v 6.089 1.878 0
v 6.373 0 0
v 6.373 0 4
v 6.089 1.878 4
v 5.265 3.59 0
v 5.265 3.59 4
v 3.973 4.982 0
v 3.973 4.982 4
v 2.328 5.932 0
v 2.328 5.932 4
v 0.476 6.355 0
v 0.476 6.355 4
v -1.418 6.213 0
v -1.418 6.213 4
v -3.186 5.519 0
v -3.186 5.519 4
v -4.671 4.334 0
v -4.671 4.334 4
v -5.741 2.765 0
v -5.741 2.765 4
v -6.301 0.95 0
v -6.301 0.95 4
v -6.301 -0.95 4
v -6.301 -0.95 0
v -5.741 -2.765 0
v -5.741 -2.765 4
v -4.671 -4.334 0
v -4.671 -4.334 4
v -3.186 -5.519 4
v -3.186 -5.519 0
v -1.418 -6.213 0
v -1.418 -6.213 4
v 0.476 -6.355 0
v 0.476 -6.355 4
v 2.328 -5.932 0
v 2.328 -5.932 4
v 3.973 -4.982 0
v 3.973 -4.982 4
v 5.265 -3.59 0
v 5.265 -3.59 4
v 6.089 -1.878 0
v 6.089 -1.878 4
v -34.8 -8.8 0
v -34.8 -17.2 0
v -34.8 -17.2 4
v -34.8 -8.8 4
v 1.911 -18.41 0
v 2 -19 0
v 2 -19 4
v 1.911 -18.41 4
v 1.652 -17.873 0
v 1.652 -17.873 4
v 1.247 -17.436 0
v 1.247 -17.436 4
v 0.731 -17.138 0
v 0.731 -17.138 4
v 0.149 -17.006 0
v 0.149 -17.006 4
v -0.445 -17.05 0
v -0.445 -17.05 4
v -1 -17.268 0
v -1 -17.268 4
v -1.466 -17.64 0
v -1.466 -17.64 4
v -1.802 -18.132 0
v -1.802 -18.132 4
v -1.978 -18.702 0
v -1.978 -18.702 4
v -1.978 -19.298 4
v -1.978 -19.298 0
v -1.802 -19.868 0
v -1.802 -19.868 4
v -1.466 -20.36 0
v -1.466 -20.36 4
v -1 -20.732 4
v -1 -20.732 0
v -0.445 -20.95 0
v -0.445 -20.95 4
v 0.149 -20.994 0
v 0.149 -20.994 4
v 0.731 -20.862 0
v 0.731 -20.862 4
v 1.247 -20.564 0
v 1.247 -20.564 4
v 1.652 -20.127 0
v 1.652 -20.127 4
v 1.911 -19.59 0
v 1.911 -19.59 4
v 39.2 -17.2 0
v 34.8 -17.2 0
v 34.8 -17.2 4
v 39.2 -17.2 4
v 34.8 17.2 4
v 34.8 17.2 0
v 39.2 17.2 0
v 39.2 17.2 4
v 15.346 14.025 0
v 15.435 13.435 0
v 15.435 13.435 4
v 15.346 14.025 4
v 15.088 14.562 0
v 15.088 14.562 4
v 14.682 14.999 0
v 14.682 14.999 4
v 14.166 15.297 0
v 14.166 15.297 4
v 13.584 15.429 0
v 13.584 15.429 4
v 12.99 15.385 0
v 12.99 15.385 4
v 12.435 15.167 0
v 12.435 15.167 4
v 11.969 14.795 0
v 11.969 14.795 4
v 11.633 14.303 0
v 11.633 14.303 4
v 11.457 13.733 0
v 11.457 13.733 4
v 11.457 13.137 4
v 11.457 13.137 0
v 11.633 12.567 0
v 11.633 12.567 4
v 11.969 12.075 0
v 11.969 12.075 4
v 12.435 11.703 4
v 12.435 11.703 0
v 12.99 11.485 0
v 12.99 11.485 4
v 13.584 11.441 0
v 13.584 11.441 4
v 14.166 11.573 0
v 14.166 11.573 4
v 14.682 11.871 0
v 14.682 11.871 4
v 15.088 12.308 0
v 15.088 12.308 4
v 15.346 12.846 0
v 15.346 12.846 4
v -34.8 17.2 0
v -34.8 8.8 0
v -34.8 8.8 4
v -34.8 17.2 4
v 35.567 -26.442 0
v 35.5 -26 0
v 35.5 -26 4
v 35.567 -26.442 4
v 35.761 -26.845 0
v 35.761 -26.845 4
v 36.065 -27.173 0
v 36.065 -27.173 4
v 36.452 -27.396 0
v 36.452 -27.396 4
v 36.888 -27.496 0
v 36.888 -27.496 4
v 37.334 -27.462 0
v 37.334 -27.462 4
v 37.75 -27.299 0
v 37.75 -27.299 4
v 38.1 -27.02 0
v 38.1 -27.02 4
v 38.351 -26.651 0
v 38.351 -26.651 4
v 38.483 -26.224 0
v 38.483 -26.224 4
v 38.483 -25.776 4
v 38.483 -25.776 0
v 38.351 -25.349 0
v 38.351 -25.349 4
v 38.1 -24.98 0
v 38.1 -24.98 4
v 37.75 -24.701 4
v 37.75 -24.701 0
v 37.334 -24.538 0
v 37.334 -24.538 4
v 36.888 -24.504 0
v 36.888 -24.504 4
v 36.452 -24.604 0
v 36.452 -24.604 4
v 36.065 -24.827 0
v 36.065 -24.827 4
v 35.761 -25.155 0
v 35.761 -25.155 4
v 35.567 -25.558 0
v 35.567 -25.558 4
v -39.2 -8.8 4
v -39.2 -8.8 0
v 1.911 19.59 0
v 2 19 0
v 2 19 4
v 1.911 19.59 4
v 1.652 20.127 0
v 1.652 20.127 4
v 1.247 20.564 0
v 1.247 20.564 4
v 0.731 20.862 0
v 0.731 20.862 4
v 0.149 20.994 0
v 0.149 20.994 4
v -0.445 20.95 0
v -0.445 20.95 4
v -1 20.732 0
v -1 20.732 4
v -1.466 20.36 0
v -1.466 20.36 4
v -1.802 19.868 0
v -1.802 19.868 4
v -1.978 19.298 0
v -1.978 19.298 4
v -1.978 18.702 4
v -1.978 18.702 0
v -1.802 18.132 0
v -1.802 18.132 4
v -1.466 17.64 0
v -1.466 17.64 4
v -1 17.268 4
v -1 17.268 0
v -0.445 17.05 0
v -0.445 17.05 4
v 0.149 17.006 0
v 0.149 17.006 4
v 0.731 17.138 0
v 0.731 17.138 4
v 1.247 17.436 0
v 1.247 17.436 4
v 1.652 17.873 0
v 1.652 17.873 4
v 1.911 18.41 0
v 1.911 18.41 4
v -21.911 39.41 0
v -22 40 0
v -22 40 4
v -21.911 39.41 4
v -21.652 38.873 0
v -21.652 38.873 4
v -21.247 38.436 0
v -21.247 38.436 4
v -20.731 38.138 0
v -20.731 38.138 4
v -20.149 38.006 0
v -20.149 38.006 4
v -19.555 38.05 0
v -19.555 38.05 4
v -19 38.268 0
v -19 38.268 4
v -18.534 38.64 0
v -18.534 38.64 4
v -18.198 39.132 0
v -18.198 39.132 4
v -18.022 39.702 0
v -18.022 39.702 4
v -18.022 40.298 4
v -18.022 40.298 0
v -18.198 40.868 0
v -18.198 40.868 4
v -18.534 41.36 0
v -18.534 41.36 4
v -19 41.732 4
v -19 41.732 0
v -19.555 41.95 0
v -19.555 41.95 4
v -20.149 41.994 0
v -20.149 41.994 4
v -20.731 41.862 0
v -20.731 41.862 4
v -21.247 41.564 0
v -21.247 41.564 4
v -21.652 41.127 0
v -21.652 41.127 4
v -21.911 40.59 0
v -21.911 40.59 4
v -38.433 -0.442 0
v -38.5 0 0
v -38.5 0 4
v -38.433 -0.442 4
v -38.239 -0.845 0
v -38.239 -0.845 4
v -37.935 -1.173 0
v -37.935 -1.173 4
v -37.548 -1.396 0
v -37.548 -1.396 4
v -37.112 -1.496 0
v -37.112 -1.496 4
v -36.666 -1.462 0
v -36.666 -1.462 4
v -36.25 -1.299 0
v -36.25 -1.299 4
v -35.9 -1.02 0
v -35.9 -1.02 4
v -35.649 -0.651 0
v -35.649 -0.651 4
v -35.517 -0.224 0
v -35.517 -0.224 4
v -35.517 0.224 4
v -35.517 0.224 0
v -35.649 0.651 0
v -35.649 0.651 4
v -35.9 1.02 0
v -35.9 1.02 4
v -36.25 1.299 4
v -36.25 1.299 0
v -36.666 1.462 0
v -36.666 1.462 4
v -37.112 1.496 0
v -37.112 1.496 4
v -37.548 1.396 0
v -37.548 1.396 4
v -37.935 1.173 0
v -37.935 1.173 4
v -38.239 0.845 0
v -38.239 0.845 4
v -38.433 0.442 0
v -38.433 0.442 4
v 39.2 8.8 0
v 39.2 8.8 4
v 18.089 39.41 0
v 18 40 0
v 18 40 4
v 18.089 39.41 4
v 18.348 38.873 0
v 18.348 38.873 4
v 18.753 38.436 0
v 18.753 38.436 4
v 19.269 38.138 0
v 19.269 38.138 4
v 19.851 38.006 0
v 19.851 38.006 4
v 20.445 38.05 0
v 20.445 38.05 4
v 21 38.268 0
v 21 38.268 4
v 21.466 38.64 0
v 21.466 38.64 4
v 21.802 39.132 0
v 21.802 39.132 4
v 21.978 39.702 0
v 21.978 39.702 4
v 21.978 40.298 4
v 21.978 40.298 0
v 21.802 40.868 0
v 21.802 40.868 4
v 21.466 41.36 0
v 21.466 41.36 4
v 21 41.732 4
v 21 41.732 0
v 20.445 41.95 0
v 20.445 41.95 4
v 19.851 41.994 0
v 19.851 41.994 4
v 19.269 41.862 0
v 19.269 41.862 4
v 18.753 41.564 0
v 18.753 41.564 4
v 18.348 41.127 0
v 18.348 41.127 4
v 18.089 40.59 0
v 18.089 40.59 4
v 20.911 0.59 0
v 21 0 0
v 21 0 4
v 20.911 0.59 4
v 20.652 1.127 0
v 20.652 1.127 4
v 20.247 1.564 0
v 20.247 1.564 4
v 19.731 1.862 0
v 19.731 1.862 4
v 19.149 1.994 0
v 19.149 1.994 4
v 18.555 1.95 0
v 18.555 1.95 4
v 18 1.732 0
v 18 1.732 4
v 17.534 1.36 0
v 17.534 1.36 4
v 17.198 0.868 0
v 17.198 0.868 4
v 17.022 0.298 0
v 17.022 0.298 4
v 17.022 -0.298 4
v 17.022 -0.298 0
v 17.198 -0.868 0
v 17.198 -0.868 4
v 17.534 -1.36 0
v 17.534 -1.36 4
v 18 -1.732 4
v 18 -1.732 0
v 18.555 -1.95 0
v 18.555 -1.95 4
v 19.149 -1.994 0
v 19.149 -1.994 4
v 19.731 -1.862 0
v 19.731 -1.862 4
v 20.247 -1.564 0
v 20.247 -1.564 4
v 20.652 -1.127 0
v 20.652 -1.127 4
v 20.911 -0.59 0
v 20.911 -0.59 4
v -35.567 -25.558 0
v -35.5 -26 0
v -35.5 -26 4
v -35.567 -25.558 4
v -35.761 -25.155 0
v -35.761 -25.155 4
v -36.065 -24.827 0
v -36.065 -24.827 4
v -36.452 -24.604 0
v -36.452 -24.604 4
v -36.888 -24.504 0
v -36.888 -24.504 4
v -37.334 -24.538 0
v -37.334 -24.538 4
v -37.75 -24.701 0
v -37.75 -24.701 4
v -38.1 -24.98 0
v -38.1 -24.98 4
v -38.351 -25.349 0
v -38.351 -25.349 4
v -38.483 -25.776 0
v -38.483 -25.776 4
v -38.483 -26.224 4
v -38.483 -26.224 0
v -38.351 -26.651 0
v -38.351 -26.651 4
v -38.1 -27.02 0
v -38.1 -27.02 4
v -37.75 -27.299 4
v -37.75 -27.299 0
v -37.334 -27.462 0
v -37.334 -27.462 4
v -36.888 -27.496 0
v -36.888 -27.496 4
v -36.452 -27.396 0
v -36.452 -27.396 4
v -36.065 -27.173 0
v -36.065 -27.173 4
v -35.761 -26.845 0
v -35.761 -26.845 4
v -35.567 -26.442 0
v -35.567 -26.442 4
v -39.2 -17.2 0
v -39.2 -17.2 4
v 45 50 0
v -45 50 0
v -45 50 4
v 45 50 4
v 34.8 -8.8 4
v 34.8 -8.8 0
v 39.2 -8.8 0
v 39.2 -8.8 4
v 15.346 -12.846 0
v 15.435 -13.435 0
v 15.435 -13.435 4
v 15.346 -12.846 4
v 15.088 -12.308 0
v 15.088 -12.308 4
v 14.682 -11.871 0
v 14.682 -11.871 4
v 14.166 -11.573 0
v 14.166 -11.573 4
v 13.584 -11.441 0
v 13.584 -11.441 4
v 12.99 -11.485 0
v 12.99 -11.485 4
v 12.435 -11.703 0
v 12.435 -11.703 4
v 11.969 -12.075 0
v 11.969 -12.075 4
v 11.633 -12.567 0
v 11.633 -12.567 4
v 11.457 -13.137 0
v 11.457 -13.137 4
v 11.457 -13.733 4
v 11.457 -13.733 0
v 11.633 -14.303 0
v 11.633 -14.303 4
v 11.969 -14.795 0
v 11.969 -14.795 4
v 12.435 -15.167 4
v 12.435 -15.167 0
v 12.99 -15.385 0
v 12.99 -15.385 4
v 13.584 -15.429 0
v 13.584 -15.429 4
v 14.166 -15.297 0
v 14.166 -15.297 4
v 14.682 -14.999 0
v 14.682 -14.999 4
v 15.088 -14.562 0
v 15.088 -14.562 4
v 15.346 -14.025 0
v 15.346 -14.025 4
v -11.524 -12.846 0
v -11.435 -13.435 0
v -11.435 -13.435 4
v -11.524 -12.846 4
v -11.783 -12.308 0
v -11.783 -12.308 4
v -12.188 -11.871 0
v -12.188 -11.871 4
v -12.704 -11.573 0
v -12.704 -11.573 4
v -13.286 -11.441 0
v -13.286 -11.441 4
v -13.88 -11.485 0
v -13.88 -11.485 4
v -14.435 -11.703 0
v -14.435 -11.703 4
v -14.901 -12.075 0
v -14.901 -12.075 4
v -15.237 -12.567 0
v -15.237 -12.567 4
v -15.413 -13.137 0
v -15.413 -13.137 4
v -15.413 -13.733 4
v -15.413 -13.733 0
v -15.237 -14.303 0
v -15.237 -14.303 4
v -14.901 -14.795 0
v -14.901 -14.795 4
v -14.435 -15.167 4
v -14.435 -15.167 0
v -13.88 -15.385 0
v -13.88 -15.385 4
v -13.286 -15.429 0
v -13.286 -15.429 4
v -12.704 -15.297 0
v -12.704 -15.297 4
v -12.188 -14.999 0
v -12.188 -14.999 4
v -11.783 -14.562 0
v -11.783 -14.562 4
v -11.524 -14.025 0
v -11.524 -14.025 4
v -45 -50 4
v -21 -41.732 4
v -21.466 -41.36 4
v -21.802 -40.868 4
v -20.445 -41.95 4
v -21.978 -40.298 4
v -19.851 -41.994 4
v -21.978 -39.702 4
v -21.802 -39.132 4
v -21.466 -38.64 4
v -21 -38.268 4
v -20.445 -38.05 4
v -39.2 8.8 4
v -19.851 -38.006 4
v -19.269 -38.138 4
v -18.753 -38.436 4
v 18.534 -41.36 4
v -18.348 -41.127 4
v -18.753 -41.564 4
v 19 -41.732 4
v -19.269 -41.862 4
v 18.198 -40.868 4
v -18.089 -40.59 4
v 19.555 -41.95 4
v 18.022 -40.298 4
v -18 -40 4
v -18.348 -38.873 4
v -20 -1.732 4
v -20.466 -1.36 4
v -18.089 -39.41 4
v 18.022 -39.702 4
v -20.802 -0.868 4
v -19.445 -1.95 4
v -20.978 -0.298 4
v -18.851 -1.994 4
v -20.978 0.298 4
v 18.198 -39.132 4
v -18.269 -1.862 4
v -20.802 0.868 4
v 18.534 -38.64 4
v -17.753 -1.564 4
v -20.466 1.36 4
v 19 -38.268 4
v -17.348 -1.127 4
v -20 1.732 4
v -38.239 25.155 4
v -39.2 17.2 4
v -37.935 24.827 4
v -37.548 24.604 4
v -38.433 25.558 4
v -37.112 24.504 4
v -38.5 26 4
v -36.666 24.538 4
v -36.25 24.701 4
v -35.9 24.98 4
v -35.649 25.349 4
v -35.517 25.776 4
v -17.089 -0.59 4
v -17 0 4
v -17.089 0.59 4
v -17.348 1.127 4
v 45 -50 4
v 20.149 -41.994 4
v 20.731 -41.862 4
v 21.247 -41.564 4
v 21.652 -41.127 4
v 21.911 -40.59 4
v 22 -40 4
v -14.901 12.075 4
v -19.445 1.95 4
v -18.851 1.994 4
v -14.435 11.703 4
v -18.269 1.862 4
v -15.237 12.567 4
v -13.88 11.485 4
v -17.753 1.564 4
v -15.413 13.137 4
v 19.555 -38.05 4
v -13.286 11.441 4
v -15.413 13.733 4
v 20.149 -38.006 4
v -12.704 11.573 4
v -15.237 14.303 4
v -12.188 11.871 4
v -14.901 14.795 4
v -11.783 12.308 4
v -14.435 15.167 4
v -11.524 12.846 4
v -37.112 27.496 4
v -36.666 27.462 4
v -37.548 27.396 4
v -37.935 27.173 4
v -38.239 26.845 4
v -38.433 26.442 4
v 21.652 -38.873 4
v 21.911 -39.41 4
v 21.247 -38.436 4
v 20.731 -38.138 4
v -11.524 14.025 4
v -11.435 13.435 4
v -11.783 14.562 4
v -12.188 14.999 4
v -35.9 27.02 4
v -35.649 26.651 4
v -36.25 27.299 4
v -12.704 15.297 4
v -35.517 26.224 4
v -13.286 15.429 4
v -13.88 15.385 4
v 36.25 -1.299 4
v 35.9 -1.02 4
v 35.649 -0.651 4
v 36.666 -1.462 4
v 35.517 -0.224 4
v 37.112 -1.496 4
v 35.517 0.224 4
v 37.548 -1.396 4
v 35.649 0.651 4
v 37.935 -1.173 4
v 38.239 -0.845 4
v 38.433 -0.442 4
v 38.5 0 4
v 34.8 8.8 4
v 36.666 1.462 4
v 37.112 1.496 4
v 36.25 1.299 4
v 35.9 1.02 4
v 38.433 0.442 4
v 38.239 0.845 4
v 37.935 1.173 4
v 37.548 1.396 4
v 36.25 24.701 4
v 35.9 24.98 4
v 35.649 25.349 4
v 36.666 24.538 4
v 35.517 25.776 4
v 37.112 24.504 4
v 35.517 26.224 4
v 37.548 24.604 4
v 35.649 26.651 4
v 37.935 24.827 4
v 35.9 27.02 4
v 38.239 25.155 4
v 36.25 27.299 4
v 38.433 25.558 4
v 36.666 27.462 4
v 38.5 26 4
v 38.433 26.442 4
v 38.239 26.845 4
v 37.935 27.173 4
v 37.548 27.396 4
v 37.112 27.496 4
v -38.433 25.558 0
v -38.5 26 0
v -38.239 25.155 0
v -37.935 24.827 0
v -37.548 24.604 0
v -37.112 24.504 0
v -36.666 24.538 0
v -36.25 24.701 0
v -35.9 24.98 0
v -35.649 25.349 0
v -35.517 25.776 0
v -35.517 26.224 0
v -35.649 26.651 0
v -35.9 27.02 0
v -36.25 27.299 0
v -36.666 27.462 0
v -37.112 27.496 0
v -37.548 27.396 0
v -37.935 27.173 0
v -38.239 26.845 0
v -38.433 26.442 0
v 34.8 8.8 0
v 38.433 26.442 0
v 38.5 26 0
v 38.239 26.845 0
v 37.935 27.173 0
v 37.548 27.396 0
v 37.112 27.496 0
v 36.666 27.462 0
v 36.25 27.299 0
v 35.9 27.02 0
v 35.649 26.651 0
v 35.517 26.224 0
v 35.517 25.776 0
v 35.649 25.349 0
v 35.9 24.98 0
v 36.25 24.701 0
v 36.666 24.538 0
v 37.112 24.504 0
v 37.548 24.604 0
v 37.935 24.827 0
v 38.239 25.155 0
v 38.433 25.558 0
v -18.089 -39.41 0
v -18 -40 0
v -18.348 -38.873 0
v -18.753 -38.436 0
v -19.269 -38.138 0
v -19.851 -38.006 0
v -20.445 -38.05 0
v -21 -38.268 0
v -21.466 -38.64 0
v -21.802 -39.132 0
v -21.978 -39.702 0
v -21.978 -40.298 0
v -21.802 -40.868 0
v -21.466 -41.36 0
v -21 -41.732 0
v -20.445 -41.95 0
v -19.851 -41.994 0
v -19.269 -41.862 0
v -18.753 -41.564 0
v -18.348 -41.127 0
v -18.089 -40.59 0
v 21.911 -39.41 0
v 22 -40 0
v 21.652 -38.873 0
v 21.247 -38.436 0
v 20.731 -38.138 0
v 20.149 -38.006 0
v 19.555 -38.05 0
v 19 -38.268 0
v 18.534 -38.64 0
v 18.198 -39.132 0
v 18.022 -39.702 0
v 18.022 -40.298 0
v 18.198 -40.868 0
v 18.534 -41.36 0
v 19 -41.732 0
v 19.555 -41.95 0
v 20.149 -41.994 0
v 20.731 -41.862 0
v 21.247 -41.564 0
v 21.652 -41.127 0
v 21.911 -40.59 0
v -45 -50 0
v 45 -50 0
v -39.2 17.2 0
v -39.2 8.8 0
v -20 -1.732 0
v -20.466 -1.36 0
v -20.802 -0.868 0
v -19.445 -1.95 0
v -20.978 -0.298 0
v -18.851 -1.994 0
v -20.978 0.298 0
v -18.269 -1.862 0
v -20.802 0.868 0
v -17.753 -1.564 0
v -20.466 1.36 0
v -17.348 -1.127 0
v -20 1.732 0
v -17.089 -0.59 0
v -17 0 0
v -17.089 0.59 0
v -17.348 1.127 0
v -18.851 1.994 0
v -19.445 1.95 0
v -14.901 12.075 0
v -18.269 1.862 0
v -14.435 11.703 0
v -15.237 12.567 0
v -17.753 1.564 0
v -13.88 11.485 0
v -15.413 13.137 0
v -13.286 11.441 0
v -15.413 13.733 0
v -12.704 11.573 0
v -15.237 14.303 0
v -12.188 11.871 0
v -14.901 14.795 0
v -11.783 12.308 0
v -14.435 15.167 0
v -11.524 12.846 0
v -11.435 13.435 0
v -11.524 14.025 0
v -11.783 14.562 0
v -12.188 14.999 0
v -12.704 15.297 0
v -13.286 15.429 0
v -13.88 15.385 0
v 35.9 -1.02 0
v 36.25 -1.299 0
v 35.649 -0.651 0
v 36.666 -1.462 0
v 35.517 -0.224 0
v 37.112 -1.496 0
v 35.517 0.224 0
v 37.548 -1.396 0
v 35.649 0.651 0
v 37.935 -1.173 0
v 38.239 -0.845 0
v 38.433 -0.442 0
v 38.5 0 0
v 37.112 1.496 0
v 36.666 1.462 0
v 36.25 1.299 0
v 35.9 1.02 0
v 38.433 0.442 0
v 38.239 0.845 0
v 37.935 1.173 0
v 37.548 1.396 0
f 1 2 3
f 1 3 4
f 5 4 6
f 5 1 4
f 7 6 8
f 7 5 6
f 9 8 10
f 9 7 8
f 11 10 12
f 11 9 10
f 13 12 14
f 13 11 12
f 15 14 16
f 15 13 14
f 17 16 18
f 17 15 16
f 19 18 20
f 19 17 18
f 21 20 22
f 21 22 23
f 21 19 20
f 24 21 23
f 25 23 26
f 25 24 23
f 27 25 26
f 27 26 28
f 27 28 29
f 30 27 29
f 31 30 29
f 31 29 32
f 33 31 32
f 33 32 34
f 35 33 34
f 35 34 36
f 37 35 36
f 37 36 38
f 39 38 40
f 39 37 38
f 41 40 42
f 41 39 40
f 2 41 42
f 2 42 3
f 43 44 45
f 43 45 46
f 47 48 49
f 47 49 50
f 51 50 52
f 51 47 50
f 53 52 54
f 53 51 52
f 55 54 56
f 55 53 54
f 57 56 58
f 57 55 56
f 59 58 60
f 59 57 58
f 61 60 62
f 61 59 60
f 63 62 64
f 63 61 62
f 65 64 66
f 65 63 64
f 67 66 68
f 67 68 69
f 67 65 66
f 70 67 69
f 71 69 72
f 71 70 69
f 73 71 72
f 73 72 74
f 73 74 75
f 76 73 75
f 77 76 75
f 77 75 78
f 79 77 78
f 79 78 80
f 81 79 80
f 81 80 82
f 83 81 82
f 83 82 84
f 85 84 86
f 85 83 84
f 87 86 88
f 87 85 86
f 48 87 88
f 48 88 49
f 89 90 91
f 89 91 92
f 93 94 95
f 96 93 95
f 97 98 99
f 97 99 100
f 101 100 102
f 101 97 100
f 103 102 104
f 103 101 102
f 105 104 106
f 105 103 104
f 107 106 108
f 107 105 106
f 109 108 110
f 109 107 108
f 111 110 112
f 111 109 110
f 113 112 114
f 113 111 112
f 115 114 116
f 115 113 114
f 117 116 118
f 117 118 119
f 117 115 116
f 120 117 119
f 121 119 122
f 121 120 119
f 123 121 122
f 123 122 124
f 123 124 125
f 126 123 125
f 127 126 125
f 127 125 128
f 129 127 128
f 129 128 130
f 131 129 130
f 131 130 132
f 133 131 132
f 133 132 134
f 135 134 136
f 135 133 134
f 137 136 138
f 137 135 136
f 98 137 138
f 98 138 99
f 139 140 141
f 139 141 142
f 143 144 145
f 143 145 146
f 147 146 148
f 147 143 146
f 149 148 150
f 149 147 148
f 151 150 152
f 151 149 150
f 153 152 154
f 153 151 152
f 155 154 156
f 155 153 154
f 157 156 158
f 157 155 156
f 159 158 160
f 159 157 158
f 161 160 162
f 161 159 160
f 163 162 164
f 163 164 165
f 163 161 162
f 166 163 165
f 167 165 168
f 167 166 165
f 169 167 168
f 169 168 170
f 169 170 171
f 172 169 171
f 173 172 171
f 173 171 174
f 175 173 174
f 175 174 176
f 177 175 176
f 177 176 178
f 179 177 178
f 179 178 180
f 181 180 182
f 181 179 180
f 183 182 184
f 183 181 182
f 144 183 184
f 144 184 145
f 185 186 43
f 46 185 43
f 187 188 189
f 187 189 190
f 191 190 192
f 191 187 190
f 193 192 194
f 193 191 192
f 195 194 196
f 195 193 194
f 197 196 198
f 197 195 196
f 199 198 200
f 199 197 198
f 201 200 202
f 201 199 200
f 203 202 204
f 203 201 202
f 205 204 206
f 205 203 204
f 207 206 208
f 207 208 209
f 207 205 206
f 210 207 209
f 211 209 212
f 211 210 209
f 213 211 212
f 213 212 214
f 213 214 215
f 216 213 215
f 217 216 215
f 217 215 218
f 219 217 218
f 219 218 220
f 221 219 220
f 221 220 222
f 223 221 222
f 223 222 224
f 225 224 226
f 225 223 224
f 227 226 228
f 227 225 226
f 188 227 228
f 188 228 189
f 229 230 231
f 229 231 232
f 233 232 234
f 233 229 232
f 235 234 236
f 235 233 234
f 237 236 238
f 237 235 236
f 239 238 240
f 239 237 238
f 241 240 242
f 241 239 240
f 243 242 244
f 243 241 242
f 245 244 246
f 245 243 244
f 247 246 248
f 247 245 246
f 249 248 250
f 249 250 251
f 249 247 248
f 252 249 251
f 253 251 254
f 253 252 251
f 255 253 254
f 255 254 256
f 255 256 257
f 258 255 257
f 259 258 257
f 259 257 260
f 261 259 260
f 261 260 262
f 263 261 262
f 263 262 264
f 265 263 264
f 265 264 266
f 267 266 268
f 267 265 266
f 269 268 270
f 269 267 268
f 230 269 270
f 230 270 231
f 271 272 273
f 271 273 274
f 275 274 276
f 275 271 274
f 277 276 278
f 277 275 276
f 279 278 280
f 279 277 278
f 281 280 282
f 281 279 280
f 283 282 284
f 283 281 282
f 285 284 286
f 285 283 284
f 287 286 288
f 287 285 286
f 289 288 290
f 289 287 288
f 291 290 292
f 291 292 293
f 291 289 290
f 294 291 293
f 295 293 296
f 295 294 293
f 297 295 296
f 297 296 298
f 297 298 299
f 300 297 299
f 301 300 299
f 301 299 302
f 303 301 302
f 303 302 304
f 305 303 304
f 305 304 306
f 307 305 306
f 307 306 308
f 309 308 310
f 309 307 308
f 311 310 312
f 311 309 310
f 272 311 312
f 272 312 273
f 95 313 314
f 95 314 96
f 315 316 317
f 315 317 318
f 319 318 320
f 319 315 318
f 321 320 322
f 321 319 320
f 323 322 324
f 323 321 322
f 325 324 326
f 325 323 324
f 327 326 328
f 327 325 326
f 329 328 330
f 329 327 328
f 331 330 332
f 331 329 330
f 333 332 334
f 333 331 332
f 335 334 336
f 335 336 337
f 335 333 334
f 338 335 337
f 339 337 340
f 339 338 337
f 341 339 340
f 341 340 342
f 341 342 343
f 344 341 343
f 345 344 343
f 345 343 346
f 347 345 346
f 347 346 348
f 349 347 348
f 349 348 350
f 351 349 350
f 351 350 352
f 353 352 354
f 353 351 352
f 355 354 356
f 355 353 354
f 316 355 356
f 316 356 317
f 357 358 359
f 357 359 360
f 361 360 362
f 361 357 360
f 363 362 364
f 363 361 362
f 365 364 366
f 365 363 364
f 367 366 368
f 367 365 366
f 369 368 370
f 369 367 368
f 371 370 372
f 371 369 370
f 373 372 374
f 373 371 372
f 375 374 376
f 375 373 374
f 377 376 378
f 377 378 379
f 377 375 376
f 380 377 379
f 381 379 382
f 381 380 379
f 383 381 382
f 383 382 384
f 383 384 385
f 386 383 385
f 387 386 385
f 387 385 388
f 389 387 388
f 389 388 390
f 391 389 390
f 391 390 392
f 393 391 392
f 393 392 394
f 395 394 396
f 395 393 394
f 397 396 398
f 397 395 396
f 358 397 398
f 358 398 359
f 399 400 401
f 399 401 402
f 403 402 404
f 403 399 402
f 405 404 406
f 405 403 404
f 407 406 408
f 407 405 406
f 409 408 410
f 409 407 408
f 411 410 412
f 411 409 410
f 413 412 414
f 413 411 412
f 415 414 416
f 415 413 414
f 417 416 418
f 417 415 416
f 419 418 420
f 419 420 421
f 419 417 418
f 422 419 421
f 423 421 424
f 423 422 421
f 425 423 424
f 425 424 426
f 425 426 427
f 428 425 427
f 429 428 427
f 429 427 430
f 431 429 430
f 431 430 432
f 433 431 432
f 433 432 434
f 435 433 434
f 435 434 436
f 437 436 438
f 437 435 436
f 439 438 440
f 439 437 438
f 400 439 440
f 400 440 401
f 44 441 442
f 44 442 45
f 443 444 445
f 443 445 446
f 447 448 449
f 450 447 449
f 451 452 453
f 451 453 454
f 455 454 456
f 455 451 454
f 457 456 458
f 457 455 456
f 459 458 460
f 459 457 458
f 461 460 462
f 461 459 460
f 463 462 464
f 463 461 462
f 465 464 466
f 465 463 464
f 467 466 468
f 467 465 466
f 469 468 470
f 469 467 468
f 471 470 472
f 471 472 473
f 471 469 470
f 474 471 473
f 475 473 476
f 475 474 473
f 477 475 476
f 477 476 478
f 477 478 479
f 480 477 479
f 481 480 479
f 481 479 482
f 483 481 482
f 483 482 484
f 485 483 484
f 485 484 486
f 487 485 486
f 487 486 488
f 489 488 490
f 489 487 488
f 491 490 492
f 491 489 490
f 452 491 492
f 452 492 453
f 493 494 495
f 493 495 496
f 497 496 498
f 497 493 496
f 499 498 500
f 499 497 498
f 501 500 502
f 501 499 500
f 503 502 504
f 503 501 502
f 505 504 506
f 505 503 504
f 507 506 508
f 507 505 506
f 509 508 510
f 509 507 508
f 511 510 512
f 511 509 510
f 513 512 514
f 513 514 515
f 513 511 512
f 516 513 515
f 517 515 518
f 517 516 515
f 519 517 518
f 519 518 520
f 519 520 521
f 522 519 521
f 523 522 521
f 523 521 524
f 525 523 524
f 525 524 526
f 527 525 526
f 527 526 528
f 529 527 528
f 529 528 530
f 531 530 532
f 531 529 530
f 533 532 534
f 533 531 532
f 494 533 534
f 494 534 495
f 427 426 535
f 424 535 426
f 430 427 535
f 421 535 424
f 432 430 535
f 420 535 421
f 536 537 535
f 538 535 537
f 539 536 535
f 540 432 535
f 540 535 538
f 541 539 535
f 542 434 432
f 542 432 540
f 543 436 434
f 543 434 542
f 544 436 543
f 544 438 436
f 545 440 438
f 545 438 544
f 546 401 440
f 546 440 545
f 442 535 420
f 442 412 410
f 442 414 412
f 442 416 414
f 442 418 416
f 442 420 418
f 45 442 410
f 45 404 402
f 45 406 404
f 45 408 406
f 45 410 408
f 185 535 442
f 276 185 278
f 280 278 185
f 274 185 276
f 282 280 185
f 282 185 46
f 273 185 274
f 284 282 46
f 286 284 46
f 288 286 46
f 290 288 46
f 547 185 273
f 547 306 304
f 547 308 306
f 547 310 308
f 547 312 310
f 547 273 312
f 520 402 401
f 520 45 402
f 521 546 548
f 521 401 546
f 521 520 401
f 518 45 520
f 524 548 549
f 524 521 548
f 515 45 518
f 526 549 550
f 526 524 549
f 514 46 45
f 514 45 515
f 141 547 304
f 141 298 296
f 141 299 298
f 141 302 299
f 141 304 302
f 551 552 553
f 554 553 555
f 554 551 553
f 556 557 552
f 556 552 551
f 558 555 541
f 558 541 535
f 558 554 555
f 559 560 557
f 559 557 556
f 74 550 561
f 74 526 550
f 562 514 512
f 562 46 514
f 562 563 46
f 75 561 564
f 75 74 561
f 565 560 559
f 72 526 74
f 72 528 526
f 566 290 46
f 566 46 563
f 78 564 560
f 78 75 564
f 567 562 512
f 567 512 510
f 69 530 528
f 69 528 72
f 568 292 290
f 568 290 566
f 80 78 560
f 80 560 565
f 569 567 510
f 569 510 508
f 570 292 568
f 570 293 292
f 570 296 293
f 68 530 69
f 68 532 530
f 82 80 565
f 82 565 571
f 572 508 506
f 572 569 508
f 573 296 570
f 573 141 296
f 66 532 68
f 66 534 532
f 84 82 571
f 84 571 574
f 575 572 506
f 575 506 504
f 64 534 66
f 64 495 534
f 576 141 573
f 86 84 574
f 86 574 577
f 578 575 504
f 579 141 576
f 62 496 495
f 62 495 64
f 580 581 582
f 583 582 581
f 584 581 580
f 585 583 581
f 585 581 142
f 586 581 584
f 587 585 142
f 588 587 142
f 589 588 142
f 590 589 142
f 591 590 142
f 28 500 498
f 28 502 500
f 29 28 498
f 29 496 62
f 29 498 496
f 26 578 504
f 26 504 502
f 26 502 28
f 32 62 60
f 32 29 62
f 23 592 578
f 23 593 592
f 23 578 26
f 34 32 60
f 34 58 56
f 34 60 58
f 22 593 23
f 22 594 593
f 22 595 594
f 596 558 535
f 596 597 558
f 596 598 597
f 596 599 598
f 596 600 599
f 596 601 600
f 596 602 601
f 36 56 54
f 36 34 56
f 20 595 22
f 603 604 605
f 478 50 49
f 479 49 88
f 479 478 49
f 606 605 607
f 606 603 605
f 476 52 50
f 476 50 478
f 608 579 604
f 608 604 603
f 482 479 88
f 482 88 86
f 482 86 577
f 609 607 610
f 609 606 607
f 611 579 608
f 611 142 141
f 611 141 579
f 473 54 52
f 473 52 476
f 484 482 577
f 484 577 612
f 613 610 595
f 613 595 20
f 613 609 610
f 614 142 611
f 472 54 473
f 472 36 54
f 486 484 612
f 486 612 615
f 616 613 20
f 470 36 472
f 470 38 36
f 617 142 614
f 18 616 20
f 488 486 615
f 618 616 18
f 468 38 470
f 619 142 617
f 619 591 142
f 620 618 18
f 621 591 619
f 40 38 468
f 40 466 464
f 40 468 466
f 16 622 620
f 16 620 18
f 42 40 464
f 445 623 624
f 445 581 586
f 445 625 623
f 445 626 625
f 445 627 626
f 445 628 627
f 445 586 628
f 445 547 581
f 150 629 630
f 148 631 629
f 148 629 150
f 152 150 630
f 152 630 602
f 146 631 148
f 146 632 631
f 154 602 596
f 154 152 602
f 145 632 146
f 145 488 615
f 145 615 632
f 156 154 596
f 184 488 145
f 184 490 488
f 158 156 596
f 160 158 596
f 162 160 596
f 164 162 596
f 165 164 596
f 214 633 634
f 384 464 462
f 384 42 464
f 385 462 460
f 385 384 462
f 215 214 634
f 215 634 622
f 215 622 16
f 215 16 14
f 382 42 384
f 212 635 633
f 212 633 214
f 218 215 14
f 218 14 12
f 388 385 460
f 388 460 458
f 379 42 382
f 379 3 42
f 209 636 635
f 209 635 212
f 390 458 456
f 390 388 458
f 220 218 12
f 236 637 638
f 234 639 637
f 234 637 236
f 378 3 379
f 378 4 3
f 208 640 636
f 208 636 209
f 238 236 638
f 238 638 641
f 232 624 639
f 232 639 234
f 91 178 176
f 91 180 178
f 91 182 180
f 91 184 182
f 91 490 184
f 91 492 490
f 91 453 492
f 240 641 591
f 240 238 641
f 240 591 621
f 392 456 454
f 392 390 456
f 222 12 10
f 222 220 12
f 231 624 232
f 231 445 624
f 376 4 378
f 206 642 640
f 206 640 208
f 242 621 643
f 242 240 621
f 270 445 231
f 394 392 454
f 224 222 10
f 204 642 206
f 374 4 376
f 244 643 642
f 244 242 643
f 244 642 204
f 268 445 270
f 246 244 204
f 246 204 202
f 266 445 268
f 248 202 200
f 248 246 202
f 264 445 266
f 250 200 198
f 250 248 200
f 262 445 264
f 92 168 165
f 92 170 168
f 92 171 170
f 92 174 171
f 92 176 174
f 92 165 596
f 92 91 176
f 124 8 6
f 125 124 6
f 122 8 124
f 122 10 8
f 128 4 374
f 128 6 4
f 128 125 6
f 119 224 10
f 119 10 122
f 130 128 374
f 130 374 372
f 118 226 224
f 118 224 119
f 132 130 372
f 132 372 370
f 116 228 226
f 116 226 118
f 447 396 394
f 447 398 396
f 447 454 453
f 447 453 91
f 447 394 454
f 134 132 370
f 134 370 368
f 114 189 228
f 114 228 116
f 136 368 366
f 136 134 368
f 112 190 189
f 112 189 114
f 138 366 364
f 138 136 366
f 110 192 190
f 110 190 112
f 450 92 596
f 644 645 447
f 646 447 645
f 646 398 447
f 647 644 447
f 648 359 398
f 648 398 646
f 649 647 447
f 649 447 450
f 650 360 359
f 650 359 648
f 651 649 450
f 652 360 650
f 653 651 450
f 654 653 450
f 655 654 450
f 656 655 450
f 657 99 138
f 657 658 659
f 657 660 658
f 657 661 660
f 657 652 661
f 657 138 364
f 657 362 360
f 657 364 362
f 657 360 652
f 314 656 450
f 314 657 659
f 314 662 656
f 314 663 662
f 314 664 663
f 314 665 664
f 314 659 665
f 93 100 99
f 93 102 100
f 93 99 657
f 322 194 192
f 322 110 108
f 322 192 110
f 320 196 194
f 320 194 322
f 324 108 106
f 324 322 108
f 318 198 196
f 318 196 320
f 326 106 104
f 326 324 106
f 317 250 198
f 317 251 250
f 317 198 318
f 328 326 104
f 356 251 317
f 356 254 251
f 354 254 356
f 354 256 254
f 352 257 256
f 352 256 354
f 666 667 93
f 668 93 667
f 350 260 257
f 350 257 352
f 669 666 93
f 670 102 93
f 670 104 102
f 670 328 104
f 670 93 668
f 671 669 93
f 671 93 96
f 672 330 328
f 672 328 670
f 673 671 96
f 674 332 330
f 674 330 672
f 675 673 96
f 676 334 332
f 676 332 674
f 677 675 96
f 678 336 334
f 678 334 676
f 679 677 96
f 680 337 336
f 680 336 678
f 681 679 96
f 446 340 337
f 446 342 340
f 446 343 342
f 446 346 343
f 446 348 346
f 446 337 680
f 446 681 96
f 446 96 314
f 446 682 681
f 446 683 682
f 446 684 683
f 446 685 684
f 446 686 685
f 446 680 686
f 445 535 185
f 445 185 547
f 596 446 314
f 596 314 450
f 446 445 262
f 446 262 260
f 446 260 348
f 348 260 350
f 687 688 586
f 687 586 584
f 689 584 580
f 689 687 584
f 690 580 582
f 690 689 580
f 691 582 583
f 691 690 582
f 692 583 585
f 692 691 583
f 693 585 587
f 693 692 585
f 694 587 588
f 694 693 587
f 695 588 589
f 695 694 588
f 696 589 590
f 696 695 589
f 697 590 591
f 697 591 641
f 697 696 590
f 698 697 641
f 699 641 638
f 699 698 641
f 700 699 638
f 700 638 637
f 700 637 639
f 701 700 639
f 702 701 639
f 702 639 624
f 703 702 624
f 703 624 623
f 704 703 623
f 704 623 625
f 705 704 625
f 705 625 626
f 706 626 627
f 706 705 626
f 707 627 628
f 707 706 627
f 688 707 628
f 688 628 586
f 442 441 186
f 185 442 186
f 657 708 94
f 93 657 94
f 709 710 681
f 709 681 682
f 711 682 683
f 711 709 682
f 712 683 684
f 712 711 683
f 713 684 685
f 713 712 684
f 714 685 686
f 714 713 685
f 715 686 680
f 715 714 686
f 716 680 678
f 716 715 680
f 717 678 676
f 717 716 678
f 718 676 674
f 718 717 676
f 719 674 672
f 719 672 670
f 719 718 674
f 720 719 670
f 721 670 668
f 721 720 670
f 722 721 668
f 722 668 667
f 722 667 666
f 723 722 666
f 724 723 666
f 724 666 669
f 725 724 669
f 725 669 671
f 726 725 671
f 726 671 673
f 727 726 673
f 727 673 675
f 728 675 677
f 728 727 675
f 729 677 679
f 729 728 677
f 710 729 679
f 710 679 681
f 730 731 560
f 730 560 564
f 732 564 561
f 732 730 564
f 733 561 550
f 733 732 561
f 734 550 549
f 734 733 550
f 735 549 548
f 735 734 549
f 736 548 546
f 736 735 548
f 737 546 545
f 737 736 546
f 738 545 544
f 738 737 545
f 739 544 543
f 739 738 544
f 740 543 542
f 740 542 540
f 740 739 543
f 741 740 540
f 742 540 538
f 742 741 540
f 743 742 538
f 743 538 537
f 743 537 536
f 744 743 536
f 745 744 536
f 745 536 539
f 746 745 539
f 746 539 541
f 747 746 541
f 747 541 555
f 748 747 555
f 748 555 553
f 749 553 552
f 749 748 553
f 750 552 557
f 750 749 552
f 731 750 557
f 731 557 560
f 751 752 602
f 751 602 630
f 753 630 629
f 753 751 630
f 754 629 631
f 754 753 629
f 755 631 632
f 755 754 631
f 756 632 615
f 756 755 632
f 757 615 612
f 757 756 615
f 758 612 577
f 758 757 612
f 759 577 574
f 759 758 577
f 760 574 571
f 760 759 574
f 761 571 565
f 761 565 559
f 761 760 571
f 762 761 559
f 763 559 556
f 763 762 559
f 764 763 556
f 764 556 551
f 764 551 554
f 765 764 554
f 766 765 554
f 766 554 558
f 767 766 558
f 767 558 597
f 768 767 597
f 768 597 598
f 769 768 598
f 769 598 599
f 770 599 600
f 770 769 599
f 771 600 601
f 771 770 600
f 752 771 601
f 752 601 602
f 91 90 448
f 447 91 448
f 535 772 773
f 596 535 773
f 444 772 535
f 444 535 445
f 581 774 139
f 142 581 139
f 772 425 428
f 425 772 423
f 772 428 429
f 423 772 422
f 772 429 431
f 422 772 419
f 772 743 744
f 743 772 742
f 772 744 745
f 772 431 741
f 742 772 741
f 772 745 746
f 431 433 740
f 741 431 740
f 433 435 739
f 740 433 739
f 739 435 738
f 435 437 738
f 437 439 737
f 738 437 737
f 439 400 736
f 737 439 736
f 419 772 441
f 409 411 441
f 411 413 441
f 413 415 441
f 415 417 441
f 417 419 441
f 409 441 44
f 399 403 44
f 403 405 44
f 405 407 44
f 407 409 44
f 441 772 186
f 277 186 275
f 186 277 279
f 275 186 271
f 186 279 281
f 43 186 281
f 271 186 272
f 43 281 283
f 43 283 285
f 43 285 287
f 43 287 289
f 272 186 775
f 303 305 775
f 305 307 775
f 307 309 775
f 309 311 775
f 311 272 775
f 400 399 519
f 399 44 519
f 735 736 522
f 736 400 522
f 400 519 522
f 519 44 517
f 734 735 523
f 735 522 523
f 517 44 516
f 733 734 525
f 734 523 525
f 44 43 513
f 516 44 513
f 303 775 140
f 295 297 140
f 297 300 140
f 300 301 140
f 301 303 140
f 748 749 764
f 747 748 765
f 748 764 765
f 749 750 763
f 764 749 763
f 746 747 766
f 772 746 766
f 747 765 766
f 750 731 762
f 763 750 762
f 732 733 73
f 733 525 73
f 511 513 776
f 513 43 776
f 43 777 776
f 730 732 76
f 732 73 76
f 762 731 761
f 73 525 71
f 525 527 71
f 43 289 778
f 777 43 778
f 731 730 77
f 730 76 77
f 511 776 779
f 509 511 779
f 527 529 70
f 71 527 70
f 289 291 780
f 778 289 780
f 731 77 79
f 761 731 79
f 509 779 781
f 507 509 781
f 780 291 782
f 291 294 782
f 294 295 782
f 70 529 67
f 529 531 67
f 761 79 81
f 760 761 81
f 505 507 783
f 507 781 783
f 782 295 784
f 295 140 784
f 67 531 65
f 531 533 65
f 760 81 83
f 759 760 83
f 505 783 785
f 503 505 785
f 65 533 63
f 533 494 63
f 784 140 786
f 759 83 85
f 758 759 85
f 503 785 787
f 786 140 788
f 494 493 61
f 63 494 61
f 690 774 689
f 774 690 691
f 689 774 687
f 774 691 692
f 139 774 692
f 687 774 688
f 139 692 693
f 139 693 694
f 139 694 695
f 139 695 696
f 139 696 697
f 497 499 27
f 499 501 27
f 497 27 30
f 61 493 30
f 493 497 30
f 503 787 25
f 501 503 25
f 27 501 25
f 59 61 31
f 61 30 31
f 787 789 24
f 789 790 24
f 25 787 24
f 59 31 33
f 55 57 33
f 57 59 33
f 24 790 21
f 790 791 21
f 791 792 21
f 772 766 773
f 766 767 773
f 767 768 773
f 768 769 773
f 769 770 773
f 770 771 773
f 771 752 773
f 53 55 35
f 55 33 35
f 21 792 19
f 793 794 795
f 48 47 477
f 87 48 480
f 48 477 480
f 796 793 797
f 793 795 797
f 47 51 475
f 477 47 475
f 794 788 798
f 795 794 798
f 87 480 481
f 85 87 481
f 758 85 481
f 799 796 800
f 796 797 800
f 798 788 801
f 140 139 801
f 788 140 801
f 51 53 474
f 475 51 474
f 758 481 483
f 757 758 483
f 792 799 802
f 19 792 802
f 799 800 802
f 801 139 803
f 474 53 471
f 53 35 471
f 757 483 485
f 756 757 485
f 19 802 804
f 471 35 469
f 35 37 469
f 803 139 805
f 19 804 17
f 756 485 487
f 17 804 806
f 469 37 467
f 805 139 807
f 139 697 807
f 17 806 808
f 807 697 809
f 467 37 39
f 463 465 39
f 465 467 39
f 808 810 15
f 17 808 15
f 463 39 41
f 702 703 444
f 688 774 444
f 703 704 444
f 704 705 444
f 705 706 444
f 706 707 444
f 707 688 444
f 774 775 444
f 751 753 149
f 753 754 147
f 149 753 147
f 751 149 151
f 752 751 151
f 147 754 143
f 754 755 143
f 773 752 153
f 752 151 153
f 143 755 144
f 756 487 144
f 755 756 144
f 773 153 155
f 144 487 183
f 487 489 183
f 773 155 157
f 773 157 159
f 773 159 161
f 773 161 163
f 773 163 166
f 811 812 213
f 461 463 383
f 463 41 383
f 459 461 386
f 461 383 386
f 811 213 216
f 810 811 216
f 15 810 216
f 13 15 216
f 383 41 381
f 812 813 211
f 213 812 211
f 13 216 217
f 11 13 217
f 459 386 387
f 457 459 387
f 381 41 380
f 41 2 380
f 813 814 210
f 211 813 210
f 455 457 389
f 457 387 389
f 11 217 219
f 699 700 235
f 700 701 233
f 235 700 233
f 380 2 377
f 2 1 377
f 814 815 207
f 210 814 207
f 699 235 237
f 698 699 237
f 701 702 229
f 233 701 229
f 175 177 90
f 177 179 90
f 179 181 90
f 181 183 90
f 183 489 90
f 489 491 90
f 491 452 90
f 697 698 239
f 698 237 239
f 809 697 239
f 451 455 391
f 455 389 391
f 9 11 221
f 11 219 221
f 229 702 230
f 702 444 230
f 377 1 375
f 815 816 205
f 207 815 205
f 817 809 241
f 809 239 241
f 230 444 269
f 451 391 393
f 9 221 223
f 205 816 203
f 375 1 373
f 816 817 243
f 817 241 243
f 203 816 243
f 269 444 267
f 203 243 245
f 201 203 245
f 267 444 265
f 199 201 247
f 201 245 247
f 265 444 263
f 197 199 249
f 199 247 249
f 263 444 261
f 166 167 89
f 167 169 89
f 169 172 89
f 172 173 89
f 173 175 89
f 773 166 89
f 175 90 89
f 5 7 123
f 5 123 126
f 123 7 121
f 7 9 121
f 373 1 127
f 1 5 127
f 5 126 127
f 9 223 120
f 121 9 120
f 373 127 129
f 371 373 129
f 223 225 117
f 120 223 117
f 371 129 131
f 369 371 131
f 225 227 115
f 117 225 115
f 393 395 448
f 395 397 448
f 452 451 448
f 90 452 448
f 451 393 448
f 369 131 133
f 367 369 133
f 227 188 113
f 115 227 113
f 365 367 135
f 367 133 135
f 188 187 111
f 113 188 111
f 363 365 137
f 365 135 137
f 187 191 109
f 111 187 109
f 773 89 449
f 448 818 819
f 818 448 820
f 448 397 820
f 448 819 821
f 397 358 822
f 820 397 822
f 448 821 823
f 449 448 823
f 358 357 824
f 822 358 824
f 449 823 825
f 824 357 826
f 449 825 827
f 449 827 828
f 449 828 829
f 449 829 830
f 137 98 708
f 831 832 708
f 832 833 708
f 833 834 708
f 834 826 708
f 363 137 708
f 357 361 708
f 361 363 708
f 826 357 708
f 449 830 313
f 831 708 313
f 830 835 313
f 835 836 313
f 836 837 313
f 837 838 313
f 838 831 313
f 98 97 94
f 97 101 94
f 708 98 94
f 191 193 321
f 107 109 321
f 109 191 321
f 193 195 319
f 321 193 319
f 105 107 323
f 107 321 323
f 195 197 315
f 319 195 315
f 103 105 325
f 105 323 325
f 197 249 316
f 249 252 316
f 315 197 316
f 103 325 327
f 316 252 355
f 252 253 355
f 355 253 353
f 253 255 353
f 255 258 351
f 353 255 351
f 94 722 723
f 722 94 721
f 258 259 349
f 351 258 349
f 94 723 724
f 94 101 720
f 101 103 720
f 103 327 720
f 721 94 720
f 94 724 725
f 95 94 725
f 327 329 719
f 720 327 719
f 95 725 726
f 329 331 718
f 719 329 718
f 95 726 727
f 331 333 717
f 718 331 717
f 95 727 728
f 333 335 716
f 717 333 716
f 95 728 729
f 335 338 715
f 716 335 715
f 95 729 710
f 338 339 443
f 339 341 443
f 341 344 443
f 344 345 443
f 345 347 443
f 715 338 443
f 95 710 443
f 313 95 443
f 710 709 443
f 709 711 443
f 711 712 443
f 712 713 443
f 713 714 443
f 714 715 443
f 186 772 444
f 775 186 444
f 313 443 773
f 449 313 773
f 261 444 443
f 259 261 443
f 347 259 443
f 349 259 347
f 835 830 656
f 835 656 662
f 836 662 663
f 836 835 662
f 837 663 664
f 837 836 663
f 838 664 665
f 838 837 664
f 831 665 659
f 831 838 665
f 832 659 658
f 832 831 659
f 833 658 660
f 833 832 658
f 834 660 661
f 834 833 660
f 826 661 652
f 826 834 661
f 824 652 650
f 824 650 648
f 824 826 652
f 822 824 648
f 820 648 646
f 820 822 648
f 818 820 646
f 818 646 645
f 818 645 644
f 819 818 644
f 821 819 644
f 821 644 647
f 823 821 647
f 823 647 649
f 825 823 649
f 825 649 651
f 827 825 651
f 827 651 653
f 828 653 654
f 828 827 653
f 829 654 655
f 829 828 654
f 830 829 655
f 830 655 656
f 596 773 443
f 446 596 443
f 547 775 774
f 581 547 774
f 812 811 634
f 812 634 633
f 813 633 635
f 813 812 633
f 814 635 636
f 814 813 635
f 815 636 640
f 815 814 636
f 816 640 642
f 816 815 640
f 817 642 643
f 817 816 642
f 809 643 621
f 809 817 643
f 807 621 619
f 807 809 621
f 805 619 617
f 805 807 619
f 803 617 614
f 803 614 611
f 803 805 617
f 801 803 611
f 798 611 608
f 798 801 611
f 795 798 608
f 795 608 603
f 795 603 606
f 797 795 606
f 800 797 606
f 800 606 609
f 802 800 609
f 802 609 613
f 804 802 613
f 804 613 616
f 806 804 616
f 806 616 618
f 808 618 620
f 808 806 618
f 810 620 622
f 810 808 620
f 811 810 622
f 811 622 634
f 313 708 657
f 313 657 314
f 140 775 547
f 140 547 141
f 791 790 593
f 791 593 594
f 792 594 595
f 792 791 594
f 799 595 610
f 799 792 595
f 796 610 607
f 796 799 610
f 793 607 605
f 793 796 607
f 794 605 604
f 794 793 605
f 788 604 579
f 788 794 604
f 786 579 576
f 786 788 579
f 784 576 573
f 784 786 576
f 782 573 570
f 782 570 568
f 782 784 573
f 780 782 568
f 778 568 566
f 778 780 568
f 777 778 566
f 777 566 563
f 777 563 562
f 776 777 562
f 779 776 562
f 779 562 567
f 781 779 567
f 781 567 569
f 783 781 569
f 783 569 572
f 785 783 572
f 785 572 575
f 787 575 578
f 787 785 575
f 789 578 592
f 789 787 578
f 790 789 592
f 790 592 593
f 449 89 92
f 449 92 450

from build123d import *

# Parameters (mm, degrees)
SKETCH_1_W      = 90
SKETCH_1_H      = 100
SKETCH_1_R      = 6.372546474
SKETCH_1_R_2    = 2
SKETCH_1_R_3    = 1.5
SKETCH_1_W_2    = 4.4
SKETCH_1_H_2    = 8.4
EXTRUDE_1_DEPTH = 4


with BuildPart() as part:
    # 草图1 → 凸台-拉伸1 (new body)
    with BuildSketch(Plane.XY):
        Rectangle(SKETCH_1_W, SKETCH_1_H)
        Circle(SKETCH_1_R, mode=Mode.SUBTRACT)
        with Locations((0, -19)):
            Circle(SKETCH_1_R_2, mode=Mode.SUBTRACT)
        with Locations((-13.435028843, -13.435028843)):
            Circle(SKETCH_1_R_2, mode=Mode.SUBTRACT)
        with Locations((-19, 0)):
            Circle(SKETCH_1_R_2, mode=Mode.SUBTRACT)
        with Locations((-13.435028843, 13.435028843)):
            Circle(SKETCH_1_R_2, mode=Mode.SUBTRACT)
        with Locations((0, 19)):
            Circle(SKETCH_1_R_2, mode=Mode.SUBTRACT)
        with Locations((13.435028843, 13.435028843)):
            Circle(SKETCH_1_R_2, mode=Mode.SUBTRACT)
        with Locations((19, 0)):
            Circle(SKETCH_1_R_2, mode=Mode.SUBTRACT)
        with Locations((13.435028843, -13.435028843)):
            Circle(SKETCH_1_R_2, mode=Mode.SUBTRACT)
        with Locations((-20, -40)):
            Circle(SKETCH_1_R_2, mode=Mode.SUBTRACT)
        with Locations((20, -40)):
            Circle(SKETCH_1_R_2, mode=Mode.SUBTRACT)
        with Locations(Location((20, 40, 0), (0, 0, 180))):
            Circle(SKETCH_1_R_2, mode=Mode.SUBTRACT)
        with Locations(Location((-20, 40, 0), (0, 0, 180))):
            Circle(SKETCH_1_R_2, mode=Mode.SUBTRACT)
        with Locations((37, 0)):
            Circle(SKETCH_1_R_3, mode=Mode.SUBTRACT)
        with Locations((37, 26)):
            Circle(SKETCH_1_R_3, mode=Mode.SUBTRACT)
        with Locations(Location((37, -26, 0), (0, 0, 180))):
            Circle(SKETCH_1_R_3, mode=Mode.SUBTRACT)
        with Locations(Location((-37, 0, 0), (0, 0, 180))):
            Circle(SKETCH_1_R_3, mode=Mode.SUBTRACT)
        with Locations((-37, -26)):
            Circle(SKETCH_1_R_3, mode=Mode.SUBTRACT)
        with Locations(Location((-37, 26, 0), (0, 0, 180))):
            Circle(SKETCH_1_R_3, mode=Mode.SUBTRACT)
        with Locations((37, -13)):
            Rectangle(SKETCH_1_W_2, SKETCH_1_H_2, mode=Mode.SUBTRACT)
        with Locations((37, 13)):
            Rectangle(SKETCH_1_W_2, SKETCH_1_H_2, mode=Mode.SUBTRACT)
        with Locations((-37, 13)):
            Rectangle(SKETCH_1_W_2, SKETCH_1_H_2, mode=Mode.SUBTRACT)
        with Locations((-37, -13)):
            Rectangle(SKETCH_1_W_2, SKETCH_1_H_2, mode=Mode.SUBTRACT)
    extrude(amount=EXTRUDE_1_DEPTH)


solid = part.part
